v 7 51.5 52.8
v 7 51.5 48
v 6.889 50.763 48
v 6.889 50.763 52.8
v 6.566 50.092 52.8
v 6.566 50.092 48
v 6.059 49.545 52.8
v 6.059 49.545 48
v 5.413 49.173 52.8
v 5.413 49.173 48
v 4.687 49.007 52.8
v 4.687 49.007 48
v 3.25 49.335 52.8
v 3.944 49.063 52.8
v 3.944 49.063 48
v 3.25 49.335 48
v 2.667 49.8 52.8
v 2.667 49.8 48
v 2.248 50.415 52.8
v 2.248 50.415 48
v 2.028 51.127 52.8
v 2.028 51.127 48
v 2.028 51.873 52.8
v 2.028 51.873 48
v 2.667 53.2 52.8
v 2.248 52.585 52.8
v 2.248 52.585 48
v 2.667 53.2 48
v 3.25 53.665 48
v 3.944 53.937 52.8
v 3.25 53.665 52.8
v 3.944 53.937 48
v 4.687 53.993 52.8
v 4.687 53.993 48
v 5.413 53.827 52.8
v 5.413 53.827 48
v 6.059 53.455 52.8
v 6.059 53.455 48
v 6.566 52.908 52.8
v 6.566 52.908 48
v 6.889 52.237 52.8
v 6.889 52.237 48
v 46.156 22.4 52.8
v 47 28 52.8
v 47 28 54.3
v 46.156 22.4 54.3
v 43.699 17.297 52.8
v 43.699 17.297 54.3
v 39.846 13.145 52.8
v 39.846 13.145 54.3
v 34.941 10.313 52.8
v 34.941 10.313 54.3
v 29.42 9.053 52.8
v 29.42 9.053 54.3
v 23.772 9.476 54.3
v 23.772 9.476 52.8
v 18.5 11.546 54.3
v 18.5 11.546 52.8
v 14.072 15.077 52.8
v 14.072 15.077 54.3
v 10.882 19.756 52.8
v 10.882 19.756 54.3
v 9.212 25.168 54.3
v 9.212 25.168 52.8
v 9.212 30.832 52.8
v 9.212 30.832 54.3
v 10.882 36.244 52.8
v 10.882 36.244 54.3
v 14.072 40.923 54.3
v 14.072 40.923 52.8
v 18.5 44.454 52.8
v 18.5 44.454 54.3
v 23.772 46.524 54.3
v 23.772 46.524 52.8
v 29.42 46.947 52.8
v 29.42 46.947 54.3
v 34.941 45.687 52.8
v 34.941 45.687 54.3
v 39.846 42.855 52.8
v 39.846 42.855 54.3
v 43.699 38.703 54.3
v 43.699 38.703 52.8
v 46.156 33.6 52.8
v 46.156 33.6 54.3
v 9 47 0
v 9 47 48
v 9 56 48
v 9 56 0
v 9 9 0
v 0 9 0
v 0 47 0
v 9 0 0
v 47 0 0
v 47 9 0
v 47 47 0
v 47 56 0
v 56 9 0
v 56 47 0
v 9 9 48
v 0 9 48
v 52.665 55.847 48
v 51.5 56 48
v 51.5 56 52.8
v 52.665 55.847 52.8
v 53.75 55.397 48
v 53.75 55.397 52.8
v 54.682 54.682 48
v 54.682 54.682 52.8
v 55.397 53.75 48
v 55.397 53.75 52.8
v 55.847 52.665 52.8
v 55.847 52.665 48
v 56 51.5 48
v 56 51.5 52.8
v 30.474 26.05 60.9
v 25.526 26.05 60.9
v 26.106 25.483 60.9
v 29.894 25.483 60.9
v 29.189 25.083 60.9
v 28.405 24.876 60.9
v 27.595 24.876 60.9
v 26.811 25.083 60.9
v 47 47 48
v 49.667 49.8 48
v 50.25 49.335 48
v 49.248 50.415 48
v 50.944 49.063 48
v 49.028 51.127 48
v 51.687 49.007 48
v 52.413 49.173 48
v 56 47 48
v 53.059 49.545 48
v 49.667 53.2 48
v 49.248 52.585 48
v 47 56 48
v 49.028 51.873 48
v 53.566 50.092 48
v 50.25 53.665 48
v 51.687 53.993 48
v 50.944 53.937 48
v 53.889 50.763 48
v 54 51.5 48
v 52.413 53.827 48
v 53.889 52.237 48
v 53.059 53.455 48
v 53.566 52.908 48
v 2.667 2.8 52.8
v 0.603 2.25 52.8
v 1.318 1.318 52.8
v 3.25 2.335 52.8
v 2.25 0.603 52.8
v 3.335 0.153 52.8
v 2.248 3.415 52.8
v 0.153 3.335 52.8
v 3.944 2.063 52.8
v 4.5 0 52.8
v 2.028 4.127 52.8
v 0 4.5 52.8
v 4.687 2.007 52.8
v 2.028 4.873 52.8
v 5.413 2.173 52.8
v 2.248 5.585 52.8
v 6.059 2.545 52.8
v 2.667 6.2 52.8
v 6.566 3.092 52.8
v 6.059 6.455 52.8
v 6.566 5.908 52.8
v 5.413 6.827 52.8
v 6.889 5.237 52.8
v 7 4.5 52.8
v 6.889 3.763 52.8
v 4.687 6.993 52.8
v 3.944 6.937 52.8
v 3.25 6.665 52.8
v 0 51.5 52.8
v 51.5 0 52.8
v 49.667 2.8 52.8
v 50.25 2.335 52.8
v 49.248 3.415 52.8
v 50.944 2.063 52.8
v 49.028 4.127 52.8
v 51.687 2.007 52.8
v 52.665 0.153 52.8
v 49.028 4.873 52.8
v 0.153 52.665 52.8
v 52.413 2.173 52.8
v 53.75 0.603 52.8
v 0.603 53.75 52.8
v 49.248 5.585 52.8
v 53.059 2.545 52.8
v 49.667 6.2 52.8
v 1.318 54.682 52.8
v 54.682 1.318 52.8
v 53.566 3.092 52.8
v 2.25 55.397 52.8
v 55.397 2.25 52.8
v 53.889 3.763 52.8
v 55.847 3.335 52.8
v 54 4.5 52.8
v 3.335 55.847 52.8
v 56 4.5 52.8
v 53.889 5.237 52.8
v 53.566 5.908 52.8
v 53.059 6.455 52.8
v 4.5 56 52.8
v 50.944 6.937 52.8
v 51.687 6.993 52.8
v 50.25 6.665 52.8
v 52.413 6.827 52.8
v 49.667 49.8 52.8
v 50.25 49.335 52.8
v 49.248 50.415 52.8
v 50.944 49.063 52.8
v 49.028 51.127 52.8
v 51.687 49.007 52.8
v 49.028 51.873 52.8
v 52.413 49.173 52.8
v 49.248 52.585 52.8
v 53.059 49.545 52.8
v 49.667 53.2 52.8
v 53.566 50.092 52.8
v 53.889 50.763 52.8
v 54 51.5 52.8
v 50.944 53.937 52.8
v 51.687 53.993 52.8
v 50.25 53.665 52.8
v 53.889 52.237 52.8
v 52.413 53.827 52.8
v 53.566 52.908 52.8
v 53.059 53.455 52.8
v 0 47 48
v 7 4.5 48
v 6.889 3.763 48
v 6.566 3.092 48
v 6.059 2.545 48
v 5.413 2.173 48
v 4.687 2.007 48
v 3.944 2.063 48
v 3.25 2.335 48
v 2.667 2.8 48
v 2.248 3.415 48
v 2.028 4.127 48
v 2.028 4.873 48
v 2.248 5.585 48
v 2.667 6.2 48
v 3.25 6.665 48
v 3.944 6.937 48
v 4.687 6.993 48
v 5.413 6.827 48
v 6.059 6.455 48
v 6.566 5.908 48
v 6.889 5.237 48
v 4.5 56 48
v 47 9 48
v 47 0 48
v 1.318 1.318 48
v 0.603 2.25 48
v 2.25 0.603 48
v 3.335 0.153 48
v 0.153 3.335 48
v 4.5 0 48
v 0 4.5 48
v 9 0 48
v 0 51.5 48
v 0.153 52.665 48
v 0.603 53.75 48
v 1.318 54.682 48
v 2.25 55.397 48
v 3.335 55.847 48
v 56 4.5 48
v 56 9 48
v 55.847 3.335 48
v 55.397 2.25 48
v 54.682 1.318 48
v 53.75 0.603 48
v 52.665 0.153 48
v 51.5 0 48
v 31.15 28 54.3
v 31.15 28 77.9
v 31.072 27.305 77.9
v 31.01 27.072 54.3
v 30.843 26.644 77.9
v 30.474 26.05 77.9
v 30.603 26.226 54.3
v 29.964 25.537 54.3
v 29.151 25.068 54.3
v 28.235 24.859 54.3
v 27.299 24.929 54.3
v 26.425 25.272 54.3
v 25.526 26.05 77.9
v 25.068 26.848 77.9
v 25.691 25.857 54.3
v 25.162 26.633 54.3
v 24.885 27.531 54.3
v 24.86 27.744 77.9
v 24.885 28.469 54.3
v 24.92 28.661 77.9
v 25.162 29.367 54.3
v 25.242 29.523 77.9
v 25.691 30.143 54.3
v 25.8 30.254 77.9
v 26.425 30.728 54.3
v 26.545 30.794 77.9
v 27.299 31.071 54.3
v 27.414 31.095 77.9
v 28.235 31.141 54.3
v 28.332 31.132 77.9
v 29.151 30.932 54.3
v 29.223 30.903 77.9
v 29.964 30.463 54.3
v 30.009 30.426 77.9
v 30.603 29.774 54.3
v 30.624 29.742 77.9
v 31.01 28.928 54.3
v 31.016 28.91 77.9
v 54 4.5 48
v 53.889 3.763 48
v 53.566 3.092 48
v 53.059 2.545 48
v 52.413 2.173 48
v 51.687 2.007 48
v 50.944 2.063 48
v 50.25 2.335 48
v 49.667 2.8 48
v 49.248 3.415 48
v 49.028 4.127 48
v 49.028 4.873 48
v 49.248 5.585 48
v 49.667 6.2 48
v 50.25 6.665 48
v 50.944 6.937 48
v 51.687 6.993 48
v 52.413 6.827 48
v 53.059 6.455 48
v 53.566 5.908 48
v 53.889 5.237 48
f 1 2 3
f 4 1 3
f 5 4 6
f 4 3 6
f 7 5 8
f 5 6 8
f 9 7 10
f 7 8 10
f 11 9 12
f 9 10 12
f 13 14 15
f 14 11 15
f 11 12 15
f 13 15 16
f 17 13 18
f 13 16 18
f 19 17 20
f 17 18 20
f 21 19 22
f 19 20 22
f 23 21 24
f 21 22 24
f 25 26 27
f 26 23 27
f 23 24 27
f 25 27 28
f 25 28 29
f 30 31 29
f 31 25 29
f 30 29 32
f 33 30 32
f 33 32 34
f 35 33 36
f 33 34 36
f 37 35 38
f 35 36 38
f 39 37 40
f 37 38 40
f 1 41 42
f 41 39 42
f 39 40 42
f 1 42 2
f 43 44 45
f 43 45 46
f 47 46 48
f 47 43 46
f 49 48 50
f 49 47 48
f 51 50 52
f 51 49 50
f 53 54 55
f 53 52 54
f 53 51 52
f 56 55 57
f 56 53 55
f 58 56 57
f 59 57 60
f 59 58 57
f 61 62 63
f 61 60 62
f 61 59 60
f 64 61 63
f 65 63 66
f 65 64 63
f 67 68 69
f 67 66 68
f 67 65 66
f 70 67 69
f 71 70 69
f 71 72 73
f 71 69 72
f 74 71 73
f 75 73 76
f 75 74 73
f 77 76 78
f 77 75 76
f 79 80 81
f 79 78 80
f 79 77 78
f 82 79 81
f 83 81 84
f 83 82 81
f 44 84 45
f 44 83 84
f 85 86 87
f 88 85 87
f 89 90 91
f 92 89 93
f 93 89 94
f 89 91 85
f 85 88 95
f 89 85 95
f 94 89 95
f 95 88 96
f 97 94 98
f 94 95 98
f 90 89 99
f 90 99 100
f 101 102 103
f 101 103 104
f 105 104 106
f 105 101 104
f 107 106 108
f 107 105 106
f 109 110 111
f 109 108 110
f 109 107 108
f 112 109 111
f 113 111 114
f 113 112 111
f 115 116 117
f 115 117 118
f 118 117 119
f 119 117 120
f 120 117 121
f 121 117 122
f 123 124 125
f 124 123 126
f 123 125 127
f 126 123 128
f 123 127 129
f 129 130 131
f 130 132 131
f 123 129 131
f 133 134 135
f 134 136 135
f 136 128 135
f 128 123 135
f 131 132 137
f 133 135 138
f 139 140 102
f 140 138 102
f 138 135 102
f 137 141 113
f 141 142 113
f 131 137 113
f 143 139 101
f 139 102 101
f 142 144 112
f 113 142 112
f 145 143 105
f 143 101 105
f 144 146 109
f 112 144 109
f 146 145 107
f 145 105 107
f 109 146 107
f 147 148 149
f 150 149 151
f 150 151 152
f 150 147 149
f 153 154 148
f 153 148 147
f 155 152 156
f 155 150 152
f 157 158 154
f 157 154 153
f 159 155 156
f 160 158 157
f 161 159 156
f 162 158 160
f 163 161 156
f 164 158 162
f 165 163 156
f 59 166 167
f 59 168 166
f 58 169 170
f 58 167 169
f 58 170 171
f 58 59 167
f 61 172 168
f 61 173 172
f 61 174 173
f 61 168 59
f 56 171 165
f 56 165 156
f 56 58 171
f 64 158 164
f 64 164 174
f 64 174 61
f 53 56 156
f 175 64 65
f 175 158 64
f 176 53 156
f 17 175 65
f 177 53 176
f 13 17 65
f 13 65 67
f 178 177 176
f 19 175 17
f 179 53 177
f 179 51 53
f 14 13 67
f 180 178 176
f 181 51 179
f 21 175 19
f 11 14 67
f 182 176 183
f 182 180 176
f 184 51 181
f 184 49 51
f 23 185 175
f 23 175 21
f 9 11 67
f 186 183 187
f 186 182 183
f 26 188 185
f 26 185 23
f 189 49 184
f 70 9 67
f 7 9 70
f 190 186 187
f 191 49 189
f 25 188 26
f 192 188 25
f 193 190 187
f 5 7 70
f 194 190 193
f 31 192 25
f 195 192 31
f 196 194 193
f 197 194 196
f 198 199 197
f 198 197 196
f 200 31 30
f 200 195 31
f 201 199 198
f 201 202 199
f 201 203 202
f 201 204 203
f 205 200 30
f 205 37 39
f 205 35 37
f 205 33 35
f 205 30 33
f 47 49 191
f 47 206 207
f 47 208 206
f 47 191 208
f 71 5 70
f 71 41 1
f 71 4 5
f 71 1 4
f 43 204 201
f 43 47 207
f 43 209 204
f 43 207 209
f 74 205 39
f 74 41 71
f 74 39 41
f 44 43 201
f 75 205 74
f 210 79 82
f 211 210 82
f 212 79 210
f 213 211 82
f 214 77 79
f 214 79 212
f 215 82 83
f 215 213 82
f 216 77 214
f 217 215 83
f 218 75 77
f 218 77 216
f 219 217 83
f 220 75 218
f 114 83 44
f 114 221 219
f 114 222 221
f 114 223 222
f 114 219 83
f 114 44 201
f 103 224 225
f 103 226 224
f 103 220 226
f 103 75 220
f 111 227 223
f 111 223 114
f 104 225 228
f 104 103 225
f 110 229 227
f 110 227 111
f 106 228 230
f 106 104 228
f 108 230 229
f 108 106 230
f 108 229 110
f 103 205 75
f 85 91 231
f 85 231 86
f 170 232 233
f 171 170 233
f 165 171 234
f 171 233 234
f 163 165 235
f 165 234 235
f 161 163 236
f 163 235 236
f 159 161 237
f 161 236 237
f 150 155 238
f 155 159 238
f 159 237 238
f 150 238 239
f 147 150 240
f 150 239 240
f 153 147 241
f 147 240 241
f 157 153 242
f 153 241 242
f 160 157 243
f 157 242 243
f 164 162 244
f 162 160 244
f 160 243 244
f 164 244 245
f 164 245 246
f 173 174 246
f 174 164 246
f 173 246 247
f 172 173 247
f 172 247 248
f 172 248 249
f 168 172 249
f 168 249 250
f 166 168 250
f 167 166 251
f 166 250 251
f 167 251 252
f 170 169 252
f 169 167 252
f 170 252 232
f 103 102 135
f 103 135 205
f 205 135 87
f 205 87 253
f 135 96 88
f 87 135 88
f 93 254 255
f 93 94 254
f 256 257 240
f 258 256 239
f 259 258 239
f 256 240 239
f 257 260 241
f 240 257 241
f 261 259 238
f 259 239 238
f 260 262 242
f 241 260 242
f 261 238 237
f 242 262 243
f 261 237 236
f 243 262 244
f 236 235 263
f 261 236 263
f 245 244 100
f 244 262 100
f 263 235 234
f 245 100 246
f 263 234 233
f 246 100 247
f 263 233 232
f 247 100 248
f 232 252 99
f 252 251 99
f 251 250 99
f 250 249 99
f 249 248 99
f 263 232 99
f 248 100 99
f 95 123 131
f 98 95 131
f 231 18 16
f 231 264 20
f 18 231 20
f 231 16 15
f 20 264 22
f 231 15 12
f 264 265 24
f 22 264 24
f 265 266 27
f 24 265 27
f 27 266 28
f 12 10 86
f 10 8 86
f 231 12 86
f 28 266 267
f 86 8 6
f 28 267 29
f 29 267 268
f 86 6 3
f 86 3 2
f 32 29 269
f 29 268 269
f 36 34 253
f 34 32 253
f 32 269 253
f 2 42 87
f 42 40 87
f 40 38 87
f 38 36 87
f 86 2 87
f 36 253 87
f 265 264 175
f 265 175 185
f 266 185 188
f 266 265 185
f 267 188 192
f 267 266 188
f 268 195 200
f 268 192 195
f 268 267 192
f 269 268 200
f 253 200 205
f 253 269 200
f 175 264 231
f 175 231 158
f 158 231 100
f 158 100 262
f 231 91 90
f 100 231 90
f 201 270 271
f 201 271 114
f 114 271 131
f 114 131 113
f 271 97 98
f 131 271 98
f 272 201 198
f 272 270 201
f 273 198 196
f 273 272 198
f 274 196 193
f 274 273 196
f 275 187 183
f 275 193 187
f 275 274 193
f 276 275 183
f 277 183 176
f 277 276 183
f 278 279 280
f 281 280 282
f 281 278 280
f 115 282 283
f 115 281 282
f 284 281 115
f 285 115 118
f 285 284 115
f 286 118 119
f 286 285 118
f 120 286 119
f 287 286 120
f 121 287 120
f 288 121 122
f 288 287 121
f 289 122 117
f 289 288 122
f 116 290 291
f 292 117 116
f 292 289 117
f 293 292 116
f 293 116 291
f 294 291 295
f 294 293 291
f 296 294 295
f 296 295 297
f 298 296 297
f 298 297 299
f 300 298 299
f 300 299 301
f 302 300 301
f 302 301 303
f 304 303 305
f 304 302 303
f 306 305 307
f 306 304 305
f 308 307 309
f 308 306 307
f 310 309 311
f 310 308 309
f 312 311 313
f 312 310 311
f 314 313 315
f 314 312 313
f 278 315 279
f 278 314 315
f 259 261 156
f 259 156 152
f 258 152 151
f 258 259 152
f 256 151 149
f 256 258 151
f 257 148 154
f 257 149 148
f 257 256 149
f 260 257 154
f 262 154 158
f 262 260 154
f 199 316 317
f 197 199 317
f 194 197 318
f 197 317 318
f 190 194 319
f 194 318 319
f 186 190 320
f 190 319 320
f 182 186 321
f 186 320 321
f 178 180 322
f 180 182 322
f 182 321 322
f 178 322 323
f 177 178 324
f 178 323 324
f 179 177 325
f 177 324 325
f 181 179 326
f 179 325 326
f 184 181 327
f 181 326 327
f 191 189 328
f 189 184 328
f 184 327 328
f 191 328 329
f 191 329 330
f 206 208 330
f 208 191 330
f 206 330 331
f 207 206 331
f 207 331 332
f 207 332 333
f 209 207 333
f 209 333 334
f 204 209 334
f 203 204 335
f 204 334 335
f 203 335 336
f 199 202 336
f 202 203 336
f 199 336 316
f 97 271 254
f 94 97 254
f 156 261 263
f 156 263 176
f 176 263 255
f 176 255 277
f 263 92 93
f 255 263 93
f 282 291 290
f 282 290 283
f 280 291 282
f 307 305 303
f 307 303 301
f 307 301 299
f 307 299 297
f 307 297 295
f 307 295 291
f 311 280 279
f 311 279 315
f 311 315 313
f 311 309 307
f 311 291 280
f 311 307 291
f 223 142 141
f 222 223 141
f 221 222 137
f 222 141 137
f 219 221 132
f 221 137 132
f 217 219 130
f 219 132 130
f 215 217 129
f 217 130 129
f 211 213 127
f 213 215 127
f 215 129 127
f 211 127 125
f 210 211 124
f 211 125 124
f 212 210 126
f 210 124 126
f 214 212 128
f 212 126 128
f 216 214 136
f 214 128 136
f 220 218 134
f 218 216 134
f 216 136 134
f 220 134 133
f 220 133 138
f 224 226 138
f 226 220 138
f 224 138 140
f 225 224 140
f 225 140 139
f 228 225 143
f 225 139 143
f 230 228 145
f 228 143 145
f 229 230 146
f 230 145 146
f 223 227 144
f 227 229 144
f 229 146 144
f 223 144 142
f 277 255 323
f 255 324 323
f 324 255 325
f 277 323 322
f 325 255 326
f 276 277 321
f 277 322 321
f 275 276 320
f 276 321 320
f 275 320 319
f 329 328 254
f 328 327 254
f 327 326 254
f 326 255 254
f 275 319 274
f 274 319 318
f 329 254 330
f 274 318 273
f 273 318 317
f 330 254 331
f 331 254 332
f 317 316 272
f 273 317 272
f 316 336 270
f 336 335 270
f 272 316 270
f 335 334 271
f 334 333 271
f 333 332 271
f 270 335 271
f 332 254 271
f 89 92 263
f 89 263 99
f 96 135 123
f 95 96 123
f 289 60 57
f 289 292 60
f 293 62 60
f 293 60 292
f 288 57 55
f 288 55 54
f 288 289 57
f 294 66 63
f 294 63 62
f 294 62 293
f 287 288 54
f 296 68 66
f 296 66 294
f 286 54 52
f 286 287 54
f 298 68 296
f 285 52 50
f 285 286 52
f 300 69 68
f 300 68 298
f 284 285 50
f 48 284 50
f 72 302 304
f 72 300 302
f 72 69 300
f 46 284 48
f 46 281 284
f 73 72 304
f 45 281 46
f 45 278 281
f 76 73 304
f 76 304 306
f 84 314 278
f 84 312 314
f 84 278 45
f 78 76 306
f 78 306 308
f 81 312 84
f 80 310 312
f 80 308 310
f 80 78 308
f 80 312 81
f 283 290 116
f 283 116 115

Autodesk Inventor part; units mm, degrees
ref_plane "YZ Plane" through (0, 0, 0) normal (1, 0, 0) x (0, 1, 0)
ref_plane "XZ Plane" through (0, 0, 0) normal (0, 1, 0) x (-1, 0, 0)
ref_plane "XY Plane" through (0, 0, 0) normal (0, 0, 1) x (1, 0, 0)
sketch "Sketch1" plane through (0, 0, 0) normal (0, 0, 1) x (1, 0, 0)
  line L0 (0, 0) -> (56, 0) construction
  line L1 (56, 0) -> (56, 56) construction
  line L2 (56, 56) -> (0, 56) construction
  line L3 (0, 56) -> (0, 0) construction
  line L4 (0, 47) -> (9, 47)
  line L5 (9, 47) -> (9, 56)
  line L6 (9, 56) -> (47, 56)
  line L7 (47, 56) -> (47, 47)
  line L8 (47, 47) -> (56, 47)
  line L9 (56, 47) -> (56, 9)
  line L10 (56, 9) -> (47, 9)
  line L11 (47, 9) -> (47, 0)
  line L12 (47, 0) -> (9, 0)
  line L13 (9, 0) -> (9, 9)
  line L14 (9, 9) -> (0, 9)
  line L15 (0, 9) -> (0, 47)
  dimension "d0" = 56
  dimension "d1" = 38
extrude "Extrusion1" add sketch "Sketch1" along normal blind 48
sketch "Sketch2" plane through (0, 0, 48) normal (0, 0, 1) x (1, 0, 0)
  line L0 (9, 47) -> (0, 47) projected
  line L1 (0, 47) -> (0, 9) projected
  line L2 (0, 9) -> (9, 9) projected
  line L3 (9, 9) -> (9, 0) projected
  line L4 (9, 0) -> (47, 0) projected
  line L5 (47, 0) -> (47, 9) projected
  line L6 (47, 9) -> (56, 9) projected
  line L7 (56, 9) -> (56, 47) projected
  line L8 (56, 47) -> (47, 47) projected
  line L9 (47, 47) -> (47, 56) projected
  line L10 (47, 56) -> (9, 56) projected
  line L11 (9, 56) -> (9, 47) projected
  line L12 (9, 47) -> (0, 47)
  line L13 (0, 47) -> (0, 56)
  line L14 (0, 56) -> (9, 56)
  line L15 (9, 56) -> (9, 47)
  line L16 (47, 47) -> (56, 47) projected
  line L17 (47, 47) -> (56, 47)
  line L18 (56, 47) -> (56, 56)
  line L19 (56, 56) -> (47, 56)
  line L20 (47, 56) -> (47, 47)
  line L21 (47, 9) -> (47, 0) projected
  line L22 (47, 9) -> (56, 9)
  line L23 (56, 9) -> (56, 0)
  line L24 (56, 0) -> (47, 0)
  line L25 (47, 0) -> (47, 9)
  line L26 (47, 0) -> (9, 0) projected
  line L27 (9, 9) -> (0, 9) projected
  line L28 (9, 0) -> (0, 0)
  line L29 (0, 0) -> (0, 9)
  line L30 (0, 9) -> (9, 9)
  line L31 (9, 9) -> (9, 0)
  line L32 (47, 9) -> (56, 9) projected
  line L33 (47, 0) -> (47, 9) projected
  line L34 (47, 47) -> (47, 56) projected
  circle A0 centre (4.5, 51.5) radius 2.5
  circle A1 centre (51.5, 51.5) radius 2.5
  circle A2 centre (51.5, 4.5) radius 2.5
  circle A3 centre (4.5, 4.5) radius 2.5
  line L35 (4.5, 51.5) -> (51.5, 51.5) construction
  line L36 (51.5, 51.5) -> (51.5, 4.5) construction
  line L37 (51.5, 4.5) -> (4.5, 4.5) construction
  line L38 (4.5, 4.5) -> (4.5, 51.5) construction
  line L39 (0, 56) -> (56, 0) construction
  line L40 (47, 47) -> (56, 56) construction
  line L41 (28, 51.5) -> (28, 28) construction
  line L42 (28, 28) -> (4.5, 28) construction
  arc A4 (4.5, 56) -> (0, 51.5) centre (4.5, 51.5) ccw
  arc A5 (56, 51.5) -> (51.5, 56) centre (51.5, 51.5) ccw
  arc A6 (0, 4.5) -> (4.5, 0) centre (4.5, 4.5) ccw
  arc A7 (51.5, 0) -> (56, 4.5) centre (51.5, 4.5) ccw
  dimension "d4" = 5
  dimension "d5" = 47
extrude "Extrusion2" add sketch "Sketch2" along normal blind 4.8 contours L11 L10 L9 L8 L7 L6 L5 L4 L3 L2 L1 L0 | L0 L13 A4 L14 L11 | L2 L3 L28 A6 L29 | L19 A5 L18 L8 L9 | L5 L6 L23 A7 L24
sketch "Sketch3" plane through (0, 0, 52.8) normal (0, 0, 1) x (1, 0, 0)
  circle A0 centre (28, 28) radius 19
  circle A1 centre (4.5, 4.5) radius 2.5 construction
  circle A2 centre (51.5, 51.5) radius 2.5 construction
  line L0 (4.5, 4.5) -> (51.5, 51.5) construction
  point P0 (0, 0)
  dimension "d8" = 38
extrude "Extrusion3" add sketch "Sketch3" along normal blind 1.5
sketch "Sketch4" plane through (28, 28, 54.3) normal (0, 0, 1) x (1, 0, 0)
  circle A0 centre (0, 0) radius 3.15
  point P0 (-28, -28)
  dimension "d11" = 6.3
extrude "Extrusion4" add sketch "Sketch4" along normal blind 6.6
sketch "Sketch5" plane through (28, 28, 60.9) normal (0, 0, 1) x (1, 0, 0)
  circle A0 centre (0, 0) radius 3.15 projected
  line L0 (-2.4739, -1.95) -> (2.4739, -1.95)
  circle A1 centre (0, 0) radius 3.15 projected
  point P0 (-28, -28)
  dimension "d14" = 5.1
extrude "Extrusion5" add sketch "Sketch5" along normal blind 17 contours A0 L0 picked at (0.6783, 0.1866)
properties part number "Big Chungus Motor"
